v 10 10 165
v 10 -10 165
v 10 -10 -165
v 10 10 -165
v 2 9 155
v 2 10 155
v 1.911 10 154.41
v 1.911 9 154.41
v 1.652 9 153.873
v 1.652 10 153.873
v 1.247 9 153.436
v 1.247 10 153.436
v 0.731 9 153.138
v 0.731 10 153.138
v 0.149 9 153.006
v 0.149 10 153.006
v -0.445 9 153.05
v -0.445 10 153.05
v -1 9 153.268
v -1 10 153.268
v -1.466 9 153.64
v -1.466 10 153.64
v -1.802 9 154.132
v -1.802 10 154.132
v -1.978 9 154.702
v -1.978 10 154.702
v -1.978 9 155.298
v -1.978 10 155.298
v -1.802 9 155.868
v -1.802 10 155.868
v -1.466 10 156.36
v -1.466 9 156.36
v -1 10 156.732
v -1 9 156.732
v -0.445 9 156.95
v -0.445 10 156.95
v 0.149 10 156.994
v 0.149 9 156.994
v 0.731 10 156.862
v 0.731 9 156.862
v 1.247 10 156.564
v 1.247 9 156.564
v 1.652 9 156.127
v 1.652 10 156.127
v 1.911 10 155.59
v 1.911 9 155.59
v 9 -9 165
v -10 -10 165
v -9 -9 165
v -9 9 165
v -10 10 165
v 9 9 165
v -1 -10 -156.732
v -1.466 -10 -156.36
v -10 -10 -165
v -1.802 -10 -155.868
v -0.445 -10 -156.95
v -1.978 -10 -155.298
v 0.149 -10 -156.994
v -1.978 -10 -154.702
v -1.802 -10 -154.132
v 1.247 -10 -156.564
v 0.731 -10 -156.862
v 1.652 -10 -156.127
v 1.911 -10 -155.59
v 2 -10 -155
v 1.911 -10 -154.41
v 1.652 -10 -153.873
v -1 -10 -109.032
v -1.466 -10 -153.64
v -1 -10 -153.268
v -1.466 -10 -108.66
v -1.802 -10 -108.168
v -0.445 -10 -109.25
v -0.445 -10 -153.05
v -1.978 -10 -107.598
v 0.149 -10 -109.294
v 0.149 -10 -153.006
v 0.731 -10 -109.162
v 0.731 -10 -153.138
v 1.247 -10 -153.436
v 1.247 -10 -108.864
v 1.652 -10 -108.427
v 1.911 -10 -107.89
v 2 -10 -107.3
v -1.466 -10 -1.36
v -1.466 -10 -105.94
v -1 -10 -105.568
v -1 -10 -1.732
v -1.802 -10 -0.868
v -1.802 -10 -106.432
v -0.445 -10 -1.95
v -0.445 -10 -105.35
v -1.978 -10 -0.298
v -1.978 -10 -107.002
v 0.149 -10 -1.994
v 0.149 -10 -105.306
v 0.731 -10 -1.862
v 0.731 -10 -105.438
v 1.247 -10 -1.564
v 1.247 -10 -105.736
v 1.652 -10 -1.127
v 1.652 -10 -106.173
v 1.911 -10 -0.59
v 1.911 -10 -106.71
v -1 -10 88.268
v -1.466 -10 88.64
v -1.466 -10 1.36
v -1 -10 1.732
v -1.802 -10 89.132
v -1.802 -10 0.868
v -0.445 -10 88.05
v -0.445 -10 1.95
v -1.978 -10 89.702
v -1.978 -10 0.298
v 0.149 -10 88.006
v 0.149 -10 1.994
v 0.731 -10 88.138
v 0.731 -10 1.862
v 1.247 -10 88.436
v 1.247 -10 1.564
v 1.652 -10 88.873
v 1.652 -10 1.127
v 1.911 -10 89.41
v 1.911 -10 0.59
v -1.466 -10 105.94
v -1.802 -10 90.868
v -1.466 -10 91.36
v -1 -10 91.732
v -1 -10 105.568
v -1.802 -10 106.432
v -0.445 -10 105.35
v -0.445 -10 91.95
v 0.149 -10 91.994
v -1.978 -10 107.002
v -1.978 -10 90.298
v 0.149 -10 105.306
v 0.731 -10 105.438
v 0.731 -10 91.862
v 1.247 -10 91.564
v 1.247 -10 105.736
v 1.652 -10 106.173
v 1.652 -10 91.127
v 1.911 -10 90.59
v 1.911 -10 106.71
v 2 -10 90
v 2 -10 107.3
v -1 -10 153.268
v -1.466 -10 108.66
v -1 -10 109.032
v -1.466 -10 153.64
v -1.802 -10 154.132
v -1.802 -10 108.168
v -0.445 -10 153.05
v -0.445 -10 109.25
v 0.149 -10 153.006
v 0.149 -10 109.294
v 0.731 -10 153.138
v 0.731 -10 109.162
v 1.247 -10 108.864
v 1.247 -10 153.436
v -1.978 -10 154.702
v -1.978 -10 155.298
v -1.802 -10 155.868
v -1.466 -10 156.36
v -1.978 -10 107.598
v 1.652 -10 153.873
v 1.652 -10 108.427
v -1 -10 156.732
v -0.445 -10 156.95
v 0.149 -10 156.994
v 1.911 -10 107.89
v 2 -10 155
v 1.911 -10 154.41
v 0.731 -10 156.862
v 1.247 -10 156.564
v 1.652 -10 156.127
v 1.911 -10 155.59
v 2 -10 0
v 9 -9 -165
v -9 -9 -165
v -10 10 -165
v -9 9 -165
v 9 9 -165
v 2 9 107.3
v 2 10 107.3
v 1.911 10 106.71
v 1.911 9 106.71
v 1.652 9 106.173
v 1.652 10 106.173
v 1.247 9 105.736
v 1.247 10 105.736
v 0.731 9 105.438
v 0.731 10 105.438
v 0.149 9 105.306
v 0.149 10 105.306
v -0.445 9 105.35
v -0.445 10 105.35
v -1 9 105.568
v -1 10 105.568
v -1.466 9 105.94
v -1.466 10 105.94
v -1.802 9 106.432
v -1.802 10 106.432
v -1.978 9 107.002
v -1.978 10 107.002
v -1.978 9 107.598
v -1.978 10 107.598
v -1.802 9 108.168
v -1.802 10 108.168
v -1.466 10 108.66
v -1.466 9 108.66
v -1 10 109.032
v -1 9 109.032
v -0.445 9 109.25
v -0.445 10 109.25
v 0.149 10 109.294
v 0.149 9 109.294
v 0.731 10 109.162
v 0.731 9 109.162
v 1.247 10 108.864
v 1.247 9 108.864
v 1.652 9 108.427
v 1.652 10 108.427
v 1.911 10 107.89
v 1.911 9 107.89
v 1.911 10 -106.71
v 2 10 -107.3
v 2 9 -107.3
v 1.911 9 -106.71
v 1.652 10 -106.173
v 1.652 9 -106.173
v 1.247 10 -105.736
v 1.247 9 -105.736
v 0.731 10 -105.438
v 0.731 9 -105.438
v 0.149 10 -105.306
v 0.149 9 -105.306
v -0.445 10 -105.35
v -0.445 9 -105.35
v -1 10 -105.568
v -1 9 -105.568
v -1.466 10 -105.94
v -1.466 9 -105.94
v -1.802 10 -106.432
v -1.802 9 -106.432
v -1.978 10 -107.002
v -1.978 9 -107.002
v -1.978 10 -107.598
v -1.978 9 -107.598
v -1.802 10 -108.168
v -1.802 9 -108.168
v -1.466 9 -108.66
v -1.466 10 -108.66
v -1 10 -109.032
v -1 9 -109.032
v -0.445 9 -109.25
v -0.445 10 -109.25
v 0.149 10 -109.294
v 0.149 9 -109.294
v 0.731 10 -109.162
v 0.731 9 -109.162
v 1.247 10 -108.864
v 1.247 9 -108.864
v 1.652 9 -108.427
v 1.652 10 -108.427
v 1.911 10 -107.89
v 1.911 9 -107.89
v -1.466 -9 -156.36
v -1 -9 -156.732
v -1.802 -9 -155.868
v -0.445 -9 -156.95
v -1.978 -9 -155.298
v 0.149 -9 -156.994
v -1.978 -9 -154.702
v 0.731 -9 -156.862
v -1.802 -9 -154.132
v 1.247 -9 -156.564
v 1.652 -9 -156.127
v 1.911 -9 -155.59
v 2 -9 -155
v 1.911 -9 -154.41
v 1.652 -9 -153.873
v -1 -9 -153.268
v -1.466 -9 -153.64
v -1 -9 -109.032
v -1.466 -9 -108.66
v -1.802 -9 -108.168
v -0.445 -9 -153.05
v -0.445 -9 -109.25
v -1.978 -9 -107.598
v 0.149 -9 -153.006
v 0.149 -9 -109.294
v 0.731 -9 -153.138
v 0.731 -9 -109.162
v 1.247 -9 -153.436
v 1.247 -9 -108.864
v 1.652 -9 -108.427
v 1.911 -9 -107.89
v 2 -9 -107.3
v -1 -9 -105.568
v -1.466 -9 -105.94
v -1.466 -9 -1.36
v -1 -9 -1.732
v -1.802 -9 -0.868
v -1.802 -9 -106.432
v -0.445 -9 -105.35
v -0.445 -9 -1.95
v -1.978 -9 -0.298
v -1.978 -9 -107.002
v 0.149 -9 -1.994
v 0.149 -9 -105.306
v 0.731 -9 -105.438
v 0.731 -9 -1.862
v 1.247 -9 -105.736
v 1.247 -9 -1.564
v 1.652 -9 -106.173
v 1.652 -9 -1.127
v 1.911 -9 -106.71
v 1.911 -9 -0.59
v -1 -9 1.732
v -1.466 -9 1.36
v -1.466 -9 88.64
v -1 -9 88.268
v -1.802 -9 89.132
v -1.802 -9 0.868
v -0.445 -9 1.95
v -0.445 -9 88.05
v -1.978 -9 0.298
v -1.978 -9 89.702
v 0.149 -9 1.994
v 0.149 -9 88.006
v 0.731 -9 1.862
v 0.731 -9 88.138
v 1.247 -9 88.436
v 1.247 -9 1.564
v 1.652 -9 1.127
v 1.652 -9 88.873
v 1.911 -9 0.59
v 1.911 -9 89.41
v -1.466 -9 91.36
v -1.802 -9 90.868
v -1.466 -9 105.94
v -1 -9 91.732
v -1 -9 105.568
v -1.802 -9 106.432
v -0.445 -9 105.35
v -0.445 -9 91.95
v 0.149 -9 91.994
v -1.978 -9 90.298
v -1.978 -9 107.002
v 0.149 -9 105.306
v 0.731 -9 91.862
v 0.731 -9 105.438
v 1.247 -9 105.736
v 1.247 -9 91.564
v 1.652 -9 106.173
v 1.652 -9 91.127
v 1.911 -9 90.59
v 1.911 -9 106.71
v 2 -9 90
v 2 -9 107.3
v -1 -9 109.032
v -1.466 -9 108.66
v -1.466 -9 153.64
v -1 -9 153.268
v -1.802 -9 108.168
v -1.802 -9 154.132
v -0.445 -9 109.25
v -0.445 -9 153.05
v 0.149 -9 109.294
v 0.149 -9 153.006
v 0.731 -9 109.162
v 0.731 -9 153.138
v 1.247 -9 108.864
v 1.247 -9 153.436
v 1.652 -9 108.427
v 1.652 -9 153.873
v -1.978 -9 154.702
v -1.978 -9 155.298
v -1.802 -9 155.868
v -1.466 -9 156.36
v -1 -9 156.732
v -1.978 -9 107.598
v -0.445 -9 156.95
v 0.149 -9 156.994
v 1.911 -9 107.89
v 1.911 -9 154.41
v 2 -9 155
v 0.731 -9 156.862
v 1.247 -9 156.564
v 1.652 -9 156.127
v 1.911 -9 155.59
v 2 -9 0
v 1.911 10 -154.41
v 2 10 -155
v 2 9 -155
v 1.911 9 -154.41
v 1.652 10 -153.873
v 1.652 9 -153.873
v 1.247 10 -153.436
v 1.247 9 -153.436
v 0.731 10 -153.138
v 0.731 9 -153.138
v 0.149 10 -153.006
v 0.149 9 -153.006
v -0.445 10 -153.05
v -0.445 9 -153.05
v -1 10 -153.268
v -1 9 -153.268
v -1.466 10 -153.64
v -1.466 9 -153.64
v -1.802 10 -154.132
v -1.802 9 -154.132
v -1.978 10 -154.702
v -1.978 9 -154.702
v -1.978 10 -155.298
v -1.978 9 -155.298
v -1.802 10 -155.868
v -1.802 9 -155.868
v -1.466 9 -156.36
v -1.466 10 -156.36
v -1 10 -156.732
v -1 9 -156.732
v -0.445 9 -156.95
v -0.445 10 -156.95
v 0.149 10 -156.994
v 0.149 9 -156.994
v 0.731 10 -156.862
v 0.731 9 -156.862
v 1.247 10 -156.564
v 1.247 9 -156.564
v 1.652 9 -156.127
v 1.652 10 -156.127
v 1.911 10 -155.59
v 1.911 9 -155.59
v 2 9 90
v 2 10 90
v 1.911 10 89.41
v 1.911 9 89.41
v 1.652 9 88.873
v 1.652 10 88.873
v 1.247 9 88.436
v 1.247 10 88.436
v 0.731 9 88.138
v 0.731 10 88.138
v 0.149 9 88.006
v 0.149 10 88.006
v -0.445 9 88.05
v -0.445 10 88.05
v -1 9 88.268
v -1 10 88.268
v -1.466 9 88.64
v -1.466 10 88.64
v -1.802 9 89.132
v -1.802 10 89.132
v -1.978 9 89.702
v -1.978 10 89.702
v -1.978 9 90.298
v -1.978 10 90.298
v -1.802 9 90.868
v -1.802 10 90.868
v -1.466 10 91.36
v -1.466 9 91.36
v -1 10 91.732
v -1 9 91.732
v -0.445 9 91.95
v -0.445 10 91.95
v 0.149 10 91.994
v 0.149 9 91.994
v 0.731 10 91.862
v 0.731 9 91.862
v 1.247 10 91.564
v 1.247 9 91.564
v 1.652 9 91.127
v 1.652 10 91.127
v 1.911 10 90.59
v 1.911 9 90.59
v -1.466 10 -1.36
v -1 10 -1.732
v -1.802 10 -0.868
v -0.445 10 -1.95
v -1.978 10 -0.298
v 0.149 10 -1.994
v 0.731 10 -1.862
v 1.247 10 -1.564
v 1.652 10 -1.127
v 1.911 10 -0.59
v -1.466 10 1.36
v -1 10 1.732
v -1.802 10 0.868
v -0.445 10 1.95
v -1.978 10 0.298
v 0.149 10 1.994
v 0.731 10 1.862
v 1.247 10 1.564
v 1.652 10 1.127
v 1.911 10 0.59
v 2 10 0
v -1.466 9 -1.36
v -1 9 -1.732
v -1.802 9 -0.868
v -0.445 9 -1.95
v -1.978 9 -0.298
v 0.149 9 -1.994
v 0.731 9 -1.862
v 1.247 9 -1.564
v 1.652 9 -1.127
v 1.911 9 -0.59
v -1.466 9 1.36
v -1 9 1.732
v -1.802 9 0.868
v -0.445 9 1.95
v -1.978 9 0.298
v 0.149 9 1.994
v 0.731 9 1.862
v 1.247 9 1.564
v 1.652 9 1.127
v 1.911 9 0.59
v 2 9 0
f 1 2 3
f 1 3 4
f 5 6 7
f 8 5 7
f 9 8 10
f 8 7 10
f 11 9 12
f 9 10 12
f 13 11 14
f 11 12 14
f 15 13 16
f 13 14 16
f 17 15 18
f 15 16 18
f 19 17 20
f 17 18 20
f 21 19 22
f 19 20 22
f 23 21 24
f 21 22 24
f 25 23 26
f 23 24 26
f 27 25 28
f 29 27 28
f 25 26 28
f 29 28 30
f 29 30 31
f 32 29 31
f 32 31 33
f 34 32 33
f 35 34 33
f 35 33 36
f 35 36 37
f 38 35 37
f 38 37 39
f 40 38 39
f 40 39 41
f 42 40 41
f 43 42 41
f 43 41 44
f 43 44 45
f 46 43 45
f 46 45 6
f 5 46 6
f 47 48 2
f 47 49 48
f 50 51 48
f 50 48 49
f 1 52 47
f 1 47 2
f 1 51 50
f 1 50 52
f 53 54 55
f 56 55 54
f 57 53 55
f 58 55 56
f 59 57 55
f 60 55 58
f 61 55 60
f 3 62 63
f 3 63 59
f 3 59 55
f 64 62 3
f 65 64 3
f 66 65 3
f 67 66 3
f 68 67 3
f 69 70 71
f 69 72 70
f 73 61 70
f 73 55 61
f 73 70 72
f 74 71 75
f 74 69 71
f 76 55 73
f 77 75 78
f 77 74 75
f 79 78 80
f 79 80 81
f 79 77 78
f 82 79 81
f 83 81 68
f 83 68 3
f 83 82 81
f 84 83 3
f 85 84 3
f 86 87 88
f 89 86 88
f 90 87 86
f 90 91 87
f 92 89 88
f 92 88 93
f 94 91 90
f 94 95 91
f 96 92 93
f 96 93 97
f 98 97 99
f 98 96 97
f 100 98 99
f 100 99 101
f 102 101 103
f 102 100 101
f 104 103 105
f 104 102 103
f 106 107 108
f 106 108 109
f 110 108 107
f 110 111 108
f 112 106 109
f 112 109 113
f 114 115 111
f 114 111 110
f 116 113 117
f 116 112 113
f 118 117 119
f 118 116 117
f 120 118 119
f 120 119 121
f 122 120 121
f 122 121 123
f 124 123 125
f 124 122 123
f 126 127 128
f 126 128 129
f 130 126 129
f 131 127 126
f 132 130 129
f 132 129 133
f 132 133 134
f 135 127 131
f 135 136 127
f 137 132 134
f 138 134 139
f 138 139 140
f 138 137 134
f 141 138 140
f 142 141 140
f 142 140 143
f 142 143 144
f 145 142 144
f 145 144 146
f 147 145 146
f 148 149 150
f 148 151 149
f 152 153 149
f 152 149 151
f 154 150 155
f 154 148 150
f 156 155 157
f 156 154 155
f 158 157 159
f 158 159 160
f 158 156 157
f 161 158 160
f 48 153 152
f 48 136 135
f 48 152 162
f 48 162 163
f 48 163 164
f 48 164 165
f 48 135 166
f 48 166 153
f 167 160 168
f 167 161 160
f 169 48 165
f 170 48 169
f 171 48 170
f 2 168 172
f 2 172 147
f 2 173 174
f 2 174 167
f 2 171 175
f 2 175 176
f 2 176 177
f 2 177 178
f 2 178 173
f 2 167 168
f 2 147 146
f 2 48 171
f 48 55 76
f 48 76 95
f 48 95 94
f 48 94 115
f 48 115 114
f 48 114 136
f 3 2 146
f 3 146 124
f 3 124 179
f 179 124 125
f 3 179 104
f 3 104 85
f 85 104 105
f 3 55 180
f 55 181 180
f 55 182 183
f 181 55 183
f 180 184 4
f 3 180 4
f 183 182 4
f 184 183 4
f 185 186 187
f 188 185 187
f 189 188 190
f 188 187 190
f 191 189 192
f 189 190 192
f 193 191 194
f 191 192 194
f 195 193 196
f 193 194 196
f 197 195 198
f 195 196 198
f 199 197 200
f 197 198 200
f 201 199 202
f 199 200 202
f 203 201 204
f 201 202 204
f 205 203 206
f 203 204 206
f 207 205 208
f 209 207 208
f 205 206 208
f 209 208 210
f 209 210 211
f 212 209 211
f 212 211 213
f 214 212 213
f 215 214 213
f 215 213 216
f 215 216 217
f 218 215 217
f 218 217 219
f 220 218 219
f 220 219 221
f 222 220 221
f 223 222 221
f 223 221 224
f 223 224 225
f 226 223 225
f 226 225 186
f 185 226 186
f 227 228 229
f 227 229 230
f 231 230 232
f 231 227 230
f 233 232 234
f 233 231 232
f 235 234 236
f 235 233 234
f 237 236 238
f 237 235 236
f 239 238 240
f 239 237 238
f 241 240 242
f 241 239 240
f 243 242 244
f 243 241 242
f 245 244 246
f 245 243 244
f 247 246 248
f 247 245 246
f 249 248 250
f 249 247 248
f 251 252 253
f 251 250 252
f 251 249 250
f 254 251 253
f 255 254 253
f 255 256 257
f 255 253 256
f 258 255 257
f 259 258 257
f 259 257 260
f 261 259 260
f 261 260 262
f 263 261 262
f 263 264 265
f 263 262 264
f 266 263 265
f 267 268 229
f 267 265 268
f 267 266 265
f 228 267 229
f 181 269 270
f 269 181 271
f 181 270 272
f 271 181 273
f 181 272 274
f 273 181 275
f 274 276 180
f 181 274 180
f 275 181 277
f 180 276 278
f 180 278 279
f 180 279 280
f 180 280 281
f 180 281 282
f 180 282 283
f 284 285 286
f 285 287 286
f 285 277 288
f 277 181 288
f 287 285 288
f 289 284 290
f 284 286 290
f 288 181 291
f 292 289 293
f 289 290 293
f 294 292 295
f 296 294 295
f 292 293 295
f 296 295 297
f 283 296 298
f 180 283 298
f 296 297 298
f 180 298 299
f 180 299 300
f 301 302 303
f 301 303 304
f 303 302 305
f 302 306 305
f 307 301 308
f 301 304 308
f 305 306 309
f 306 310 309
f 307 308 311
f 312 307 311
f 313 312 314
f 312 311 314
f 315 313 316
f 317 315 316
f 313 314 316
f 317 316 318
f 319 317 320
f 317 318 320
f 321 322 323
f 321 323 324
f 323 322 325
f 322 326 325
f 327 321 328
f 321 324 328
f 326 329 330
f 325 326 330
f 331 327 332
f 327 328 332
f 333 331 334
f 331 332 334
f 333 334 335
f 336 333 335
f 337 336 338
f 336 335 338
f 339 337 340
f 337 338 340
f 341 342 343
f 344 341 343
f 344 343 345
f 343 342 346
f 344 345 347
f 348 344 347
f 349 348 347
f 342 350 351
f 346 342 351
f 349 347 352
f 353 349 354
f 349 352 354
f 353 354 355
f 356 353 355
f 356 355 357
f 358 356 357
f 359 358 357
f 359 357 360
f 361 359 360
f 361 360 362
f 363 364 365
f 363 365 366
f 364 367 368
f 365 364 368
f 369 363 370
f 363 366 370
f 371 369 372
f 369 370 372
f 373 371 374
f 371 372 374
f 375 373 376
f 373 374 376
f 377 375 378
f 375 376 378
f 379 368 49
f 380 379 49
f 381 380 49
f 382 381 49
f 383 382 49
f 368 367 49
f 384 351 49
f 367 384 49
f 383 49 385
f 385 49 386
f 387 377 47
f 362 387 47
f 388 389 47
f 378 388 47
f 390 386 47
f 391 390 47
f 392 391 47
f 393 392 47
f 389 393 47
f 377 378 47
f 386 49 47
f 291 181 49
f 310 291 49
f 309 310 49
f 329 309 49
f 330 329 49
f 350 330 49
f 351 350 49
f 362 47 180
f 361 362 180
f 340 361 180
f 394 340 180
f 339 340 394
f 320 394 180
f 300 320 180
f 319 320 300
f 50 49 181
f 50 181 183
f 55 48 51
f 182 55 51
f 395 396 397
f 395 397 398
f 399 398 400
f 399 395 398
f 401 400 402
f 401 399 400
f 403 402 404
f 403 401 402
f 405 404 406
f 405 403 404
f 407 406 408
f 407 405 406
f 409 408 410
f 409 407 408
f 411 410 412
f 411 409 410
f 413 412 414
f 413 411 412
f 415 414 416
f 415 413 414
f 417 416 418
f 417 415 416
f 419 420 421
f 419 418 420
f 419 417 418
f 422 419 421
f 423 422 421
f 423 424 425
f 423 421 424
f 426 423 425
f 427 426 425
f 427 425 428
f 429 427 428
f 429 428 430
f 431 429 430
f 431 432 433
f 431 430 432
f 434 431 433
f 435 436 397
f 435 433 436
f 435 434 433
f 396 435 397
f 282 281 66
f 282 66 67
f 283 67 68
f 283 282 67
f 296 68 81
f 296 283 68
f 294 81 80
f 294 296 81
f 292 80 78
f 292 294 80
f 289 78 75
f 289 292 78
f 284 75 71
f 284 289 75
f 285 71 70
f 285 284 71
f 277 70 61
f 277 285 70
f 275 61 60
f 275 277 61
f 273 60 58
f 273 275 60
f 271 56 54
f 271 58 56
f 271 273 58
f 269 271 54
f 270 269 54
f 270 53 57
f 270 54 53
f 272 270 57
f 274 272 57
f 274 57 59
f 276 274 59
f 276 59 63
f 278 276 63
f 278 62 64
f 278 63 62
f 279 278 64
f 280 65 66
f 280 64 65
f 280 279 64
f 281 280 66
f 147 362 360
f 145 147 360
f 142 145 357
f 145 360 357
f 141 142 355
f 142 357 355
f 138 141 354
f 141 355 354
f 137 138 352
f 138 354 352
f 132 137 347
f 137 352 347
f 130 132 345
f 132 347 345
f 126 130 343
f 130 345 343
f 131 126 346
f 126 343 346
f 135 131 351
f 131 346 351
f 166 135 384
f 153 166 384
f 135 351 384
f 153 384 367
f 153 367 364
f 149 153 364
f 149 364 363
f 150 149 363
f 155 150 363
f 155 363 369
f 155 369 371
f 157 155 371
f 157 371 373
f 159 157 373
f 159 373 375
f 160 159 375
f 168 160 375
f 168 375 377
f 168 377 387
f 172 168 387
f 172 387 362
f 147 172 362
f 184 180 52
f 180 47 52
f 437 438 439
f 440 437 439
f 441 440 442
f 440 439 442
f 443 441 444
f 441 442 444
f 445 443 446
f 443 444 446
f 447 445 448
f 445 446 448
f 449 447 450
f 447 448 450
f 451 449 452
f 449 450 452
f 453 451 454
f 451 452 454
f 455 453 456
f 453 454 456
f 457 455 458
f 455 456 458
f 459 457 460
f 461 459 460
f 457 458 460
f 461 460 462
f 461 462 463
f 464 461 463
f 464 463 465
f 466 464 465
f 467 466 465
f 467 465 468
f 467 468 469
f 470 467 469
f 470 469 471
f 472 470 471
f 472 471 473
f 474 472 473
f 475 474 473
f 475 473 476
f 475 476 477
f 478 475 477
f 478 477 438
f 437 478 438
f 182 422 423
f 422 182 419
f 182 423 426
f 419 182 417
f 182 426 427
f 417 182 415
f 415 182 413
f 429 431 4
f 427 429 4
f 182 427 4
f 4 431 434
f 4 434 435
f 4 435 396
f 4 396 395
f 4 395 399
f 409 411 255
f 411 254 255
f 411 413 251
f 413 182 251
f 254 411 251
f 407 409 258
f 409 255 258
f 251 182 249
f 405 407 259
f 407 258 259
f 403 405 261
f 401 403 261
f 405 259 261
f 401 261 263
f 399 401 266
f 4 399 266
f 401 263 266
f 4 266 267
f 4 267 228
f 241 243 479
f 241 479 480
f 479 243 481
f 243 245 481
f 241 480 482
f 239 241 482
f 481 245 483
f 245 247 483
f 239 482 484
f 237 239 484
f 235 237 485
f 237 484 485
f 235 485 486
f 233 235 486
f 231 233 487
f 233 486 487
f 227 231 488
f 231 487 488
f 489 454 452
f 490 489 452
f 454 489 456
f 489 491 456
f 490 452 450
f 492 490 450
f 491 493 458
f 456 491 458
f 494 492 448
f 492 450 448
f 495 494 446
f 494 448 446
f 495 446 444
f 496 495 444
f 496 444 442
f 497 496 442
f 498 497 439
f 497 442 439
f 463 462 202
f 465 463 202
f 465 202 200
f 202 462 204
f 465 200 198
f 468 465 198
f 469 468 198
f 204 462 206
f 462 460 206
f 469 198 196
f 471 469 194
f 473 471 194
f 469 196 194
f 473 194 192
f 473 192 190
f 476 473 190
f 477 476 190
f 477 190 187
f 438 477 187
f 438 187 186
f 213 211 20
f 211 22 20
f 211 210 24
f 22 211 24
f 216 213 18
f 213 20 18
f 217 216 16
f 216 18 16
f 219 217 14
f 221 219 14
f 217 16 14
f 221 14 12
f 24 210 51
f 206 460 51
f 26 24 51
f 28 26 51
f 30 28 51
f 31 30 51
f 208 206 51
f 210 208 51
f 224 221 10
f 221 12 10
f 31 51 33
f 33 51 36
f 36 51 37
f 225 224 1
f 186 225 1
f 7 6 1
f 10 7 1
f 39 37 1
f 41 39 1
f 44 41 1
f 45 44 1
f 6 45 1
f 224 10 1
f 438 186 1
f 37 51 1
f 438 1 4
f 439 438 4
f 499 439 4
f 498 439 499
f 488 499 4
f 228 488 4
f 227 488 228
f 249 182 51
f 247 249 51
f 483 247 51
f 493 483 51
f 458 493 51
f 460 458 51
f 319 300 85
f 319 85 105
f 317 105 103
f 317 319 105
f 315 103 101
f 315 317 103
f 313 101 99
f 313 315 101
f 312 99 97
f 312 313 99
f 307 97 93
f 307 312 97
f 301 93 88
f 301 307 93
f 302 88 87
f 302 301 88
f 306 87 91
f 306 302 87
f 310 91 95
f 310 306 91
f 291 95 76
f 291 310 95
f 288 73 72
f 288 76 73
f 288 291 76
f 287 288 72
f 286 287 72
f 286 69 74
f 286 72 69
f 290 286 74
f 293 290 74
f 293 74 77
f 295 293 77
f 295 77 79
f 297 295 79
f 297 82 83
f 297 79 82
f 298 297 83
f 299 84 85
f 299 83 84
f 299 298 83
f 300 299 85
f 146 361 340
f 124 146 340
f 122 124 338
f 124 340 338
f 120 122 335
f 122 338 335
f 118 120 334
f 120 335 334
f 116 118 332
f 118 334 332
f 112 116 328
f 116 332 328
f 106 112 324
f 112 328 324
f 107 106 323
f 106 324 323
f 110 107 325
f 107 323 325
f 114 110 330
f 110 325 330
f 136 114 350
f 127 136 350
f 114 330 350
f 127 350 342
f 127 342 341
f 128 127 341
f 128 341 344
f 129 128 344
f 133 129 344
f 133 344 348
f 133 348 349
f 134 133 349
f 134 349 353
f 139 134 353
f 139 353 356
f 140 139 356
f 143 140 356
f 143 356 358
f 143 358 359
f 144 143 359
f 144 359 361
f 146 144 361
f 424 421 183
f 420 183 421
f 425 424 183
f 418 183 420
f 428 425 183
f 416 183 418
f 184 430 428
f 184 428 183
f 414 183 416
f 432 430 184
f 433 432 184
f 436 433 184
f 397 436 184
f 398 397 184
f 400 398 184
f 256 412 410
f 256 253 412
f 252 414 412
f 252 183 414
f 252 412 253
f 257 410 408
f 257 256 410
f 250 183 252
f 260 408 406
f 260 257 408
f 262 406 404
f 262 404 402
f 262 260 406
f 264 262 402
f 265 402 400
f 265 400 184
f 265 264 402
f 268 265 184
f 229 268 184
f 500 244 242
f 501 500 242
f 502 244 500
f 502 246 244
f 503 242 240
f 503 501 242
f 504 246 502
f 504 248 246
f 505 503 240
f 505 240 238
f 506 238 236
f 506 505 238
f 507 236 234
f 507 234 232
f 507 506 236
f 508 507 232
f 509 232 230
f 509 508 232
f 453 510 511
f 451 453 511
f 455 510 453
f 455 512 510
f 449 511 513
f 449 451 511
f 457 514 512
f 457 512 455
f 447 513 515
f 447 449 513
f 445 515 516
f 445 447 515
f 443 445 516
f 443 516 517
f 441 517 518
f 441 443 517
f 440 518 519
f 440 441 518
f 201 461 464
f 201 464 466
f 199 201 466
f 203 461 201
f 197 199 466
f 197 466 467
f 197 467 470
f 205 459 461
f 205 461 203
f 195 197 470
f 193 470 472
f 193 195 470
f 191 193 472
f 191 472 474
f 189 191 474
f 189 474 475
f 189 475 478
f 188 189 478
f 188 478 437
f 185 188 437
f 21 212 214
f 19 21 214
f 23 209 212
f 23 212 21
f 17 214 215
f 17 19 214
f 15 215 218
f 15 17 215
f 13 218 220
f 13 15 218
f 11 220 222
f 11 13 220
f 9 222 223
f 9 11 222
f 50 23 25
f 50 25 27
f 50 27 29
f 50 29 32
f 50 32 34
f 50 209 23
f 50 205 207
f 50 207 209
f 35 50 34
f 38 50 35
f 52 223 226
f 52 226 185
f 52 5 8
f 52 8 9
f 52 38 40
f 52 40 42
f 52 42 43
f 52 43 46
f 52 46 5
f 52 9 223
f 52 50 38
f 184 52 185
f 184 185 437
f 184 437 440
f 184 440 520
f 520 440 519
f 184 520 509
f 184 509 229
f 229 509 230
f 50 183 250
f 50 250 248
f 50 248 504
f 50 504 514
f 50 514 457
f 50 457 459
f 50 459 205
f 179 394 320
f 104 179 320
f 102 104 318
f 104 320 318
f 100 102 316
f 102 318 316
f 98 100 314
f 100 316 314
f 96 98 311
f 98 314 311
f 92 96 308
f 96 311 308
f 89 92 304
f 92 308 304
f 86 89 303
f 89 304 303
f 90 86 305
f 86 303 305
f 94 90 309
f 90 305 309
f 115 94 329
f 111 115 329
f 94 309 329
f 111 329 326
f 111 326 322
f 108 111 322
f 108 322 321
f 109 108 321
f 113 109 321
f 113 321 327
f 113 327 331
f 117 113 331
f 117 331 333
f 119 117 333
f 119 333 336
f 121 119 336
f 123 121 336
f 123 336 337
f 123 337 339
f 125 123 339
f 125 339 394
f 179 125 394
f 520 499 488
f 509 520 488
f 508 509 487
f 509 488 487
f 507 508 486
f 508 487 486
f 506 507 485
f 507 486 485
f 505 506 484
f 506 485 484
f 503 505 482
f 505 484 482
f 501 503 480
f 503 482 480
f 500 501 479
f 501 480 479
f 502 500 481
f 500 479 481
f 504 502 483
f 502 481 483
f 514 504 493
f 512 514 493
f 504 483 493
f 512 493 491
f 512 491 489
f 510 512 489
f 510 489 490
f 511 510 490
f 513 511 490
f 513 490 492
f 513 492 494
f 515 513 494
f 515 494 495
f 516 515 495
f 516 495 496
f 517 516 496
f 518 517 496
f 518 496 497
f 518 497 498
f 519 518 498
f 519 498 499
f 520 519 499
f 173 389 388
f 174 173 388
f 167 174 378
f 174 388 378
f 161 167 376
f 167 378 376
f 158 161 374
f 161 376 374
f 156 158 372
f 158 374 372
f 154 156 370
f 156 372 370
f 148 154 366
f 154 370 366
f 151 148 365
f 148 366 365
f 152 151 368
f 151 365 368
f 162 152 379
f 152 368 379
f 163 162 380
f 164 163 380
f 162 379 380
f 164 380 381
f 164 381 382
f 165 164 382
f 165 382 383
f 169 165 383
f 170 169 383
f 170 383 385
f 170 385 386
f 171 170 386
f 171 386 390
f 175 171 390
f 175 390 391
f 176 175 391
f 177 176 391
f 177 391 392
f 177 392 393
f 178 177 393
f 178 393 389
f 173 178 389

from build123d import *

# Parameters (mm, degrees)
SKETCH_1_W            = 20
SKETCH_1_H            = 20
SKETCH_1_W_2          = 18
SKETCH_1_H_2          = 18
EXTRUDE_1_DEPTH       = 165
MM_1_D                = 4
HOLE_WIZARD_4_0_4_1_D = 4
HOLE_WIZARD_4_0_4_2_D = 4


with BuildPart() as part:
    # 草图1 → 凸台-拉伸1 (new, symmetric)
    with BuildSketch(Plane.XY):
        Rectangle(SKETCH_1_W, SKETCH_1_H)
        Rectangle(SKETCH_1_W_2, SKETCH_1_H_2, mode=Mode.SUBTRACT)
    extrude(amount=EXTRUDE_1_DEPTH, both=True)

    # 大小mm 暗销孔1 (through all)
    with Locations(Plane(origin=(0, -10, 0), x_dir=(-1, 0, 0), z_dir=(0, -1, 0))):
        with Locations((0, -107.3)):
            mm_1 = Hole(MM_1_D / 2)

    # 镜向1: 大小mm 暗销孔1 across plane
    add(mm_1.mirror(Plane.XY), mode=Mode.SUBTRACT)

    # Ø4.0 (4) 直径孔1 (through all)
    with Locations(Plane(origin=(0, -10, 0), x_dir=(-1, 0, 0), z_dir=(0, -1, 0))):
        with Locations((0, -155)):
            hole_wizard_4_0_4_1 = Hole(HOLE_WIZARD_4_0_4_1_D / 2)

    # 镜向2: Ø4.0 (4) 直径孔1 across plane
    add(hole_wizard_4_0_4_1.mirror(Plane.XY), mode=Mode.SUBTRACT)

    # Ø4.0 (4) 直径孔2 (through all)
    with Locations(Plane(origin=(0, -10, 0), x_dir=(-1, 0, 0), z_dir=(0, -1, 0))):
        with Locations((0, -90), (0, 0)):
            Hole(HOLE_WIZARD_4_0_4_2_D / 2)


solid = part.part
